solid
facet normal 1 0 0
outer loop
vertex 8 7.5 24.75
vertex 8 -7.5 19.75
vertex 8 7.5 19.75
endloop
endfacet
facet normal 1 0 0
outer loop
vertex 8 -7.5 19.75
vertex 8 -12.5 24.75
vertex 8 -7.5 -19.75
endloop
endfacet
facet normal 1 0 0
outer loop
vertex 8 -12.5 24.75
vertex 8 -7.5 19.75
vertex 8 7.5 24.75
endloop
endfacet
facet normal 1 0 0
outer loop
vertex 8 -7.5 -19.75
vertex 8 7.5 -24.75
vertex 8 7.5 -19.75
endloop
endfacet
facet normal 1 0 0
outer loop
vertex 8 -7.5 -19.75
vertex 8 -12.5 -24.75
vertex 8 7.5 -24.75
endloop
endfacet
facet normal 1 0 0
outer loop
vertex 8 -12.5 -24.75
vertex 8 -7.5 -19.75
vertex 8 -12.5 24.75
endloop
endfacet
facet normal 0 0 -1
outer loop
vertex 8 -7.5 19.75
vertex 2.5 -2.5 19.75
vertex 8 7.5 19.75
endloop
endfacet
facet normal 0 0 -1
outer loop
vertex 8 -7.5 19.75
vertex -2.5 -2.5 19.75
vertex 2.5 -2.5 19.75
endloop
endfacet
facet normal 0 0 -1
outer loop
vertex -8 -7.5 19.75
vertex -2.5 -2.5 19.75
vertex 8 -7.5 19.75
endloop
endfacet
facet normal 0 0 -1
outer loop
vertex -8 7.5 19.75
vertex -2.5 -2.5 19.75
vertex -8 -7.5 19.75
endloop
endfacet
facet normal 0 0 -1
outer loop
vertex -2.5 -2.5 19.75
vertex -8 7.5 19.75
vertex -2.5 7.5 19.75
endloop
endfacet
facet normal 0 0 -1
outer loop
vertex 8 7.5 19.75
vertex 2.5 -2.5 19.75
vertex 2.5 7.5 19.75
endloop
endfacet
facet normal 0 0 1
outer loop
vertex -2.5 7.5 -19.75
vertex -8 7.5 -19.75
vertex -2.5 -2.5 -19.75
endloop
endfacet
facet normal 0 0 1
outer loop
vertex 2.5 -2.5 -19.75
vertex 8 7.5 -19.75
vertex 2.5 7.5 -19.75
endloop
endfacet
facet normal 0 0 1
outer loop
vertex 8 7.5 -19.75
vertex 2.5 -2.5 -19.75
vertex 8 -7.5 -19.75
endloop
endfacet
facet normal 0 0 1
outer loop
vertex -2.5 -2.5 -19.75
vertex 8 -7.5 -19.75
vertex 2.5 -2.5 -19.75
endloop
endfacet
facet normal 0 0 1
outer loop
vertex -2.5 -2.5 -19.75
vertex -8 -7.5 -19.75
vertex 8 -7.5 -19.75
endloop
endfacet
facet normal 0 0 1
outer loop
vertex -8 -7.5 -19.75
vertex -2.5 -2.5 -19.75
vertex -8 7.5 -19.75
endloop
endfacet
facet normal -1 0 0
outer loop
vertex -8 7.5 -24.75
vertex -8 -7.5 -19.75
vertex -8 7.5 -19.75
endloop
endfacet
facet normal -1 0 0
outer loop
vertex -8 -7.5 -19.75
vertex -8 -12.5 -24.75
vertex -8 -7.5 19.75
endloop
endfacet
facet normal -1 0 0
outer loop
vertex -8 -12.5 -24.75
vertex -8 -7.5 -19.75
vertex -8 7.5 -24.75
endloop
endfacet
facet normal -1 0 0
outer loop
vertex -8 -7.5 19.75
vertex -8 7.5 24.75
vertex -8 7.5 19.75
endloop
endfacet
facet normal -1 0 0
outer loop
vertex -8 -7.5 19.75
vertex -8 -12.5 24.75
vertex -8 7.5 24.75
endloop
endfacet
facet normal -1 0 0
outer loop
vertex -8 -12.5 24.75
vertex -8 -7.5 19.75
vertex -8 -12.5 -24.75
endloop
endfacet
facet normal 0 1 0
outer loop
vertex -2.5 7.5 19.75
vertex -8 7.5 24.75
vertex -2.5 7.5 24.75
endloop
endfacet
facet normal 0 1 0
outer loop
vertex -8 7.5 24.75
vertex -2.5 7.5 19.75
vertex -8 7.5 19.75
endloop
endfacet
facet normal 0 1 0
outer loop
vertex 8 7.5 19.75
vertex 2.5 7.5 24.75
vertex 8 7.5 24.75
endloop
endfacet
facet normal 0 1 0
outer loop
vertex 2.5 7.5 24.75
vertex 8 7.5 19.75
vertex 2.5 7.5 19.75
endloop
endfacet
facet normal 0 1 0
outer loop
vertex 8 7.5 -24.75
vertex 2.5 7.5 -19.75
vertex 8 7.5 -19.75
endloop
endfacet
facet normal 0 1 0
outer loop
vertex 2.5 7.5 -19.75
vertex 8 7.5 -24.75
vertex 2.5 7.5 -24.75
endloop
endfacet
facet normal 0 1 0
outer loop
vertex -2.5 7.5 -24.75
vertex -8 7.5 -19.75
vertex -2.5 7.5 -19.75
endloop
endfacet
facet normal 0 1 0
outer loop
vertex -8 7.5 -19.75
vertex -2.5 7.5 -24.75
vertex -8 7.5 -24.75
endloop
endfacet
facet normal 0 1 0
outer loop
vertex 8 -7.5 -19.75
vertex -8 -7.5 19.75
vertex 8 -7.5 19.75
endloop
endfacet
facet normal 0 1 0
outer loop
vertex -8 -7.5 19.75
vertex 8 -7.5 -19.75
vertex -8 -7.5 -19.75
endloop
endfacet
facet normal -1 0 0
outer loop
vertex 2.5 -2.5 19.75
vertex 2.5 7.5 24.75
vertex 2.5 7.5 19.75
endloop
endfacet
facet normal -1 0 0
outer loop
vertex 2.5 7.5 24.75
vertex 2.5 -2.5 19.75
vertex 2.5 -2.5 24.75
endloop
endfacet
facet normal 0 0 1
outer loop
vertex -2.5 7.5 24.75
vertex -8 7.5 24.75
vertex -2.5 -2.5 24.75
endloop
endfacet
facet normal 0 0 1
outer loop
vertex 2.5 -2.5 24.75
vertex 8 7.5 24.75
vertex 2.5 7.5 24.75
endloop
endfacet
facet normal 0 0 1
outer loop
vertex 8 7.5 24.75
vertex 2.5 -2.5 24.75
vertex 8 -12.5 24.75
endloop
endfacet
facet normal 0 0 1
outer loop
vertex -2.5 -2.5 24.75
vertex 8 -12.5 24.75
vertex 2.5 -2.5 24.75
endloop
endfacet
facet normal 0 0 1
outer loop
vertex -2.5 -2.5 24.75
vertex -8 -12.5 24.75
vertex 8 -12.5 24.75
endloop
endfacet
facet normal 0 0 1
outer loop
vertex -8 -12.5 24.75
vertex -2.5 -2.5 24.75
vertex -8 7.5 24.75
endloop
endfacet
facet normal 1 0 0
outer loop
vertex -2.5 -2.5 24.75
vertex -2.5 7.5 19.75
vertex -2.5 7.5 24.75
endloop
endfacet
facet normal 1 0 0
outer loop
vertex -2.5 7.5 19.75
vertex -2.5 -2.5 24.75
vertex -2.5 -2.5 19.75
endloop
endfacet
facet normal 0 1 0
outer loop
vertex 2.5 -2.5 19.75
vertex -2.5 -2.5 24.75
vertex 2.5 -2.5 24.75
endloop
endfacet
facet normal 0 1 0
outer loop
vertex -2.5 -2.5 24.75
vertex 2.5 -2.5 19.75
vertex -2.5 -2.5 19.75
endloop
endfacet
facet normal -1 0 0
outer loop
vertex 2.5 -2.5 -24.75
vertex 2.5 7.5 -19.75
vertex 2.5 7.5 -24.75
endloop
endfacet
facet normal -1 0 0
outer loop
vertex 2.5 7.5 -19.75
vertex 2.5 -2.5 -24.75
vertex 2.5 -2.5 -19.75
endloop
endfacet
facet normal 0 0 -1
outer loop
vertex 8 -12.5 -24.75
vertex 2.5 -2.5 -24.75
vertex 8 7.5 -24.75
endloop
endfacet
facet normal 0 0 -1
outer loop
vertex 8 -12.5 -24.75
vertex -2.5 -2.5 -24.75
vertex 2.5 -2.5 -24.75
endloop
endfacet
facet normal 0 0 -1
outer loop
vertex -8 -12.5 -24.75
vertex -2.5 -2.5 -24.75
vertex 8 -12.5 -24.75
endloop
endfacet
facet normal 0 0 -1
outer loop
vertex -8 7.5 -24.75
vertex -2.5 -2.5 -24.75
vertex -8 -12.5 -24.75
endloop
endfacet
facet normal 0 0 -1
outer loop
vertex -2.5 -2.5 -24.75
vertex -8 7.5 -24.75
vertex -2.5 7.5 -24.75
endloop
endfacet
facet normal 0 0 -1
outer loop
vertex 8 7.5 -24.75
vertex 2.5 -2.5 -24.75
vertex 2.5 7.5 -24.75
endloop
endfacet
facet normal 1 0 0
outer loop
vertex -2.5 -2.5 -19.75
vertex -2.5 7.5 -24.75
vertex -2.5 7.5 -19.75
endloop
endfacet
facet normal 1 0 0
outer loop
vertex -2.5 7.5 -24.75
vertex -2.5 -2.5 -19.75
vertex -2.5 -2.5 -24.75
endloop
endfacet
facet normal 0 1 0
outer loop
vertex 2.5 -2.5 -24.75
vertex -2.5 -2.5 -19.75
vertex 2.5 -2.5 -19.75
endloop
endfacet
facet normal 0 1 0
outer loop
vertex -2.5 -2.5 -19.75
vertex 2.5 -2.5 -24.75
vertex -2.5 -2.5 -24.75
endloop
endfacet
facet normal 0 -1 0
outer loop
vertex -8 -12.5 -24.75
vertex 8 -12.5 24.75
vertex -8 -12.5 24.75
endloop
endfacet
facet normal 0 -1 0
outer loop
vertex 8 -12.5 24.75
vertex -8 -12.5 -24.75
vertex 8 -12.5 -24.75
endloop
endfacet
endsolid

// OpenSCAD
$fn = 75;

female_width = 16;
female_depth = 15;
female_height = 39.5;

line_hole_d = 5;

cut_thicknes = 5;
cut_depth = (female_depth+line_hole_d)/2;


difference() {
    external_form();
    form();
};

module external_form() {
    translate([
        0,
        -cut_thicknes/2,
        0
    ])
    cube([
        female_width,
        female_depth+cut_thicknes,
        female_height+2*cut_thicknes],
    center=true);
};

module form() {
    union() {
        base();
        translate([
            0,
            (female_depth-cut_depth)/2,
            (female_height+cut_thicknes)/2
        ])
        cut();
        translate([
            0,
            (female_depth-cut_depth)/2,
            -(female_height+cut_thicknes)/2
        ])
        cut();
    };
};

module base() {
    cube([female_width, female_depth, female_height], center=true);
};

module line_hole() {
    cylinder(r1=line_hole_d/2, r2=line_hole_d/2, h=female_height, center=true);
};

module cut() {
    cube([
    line_hole_d,
    cut_depth,
    cut_thicknes
    ],
    center=true
    );
};
